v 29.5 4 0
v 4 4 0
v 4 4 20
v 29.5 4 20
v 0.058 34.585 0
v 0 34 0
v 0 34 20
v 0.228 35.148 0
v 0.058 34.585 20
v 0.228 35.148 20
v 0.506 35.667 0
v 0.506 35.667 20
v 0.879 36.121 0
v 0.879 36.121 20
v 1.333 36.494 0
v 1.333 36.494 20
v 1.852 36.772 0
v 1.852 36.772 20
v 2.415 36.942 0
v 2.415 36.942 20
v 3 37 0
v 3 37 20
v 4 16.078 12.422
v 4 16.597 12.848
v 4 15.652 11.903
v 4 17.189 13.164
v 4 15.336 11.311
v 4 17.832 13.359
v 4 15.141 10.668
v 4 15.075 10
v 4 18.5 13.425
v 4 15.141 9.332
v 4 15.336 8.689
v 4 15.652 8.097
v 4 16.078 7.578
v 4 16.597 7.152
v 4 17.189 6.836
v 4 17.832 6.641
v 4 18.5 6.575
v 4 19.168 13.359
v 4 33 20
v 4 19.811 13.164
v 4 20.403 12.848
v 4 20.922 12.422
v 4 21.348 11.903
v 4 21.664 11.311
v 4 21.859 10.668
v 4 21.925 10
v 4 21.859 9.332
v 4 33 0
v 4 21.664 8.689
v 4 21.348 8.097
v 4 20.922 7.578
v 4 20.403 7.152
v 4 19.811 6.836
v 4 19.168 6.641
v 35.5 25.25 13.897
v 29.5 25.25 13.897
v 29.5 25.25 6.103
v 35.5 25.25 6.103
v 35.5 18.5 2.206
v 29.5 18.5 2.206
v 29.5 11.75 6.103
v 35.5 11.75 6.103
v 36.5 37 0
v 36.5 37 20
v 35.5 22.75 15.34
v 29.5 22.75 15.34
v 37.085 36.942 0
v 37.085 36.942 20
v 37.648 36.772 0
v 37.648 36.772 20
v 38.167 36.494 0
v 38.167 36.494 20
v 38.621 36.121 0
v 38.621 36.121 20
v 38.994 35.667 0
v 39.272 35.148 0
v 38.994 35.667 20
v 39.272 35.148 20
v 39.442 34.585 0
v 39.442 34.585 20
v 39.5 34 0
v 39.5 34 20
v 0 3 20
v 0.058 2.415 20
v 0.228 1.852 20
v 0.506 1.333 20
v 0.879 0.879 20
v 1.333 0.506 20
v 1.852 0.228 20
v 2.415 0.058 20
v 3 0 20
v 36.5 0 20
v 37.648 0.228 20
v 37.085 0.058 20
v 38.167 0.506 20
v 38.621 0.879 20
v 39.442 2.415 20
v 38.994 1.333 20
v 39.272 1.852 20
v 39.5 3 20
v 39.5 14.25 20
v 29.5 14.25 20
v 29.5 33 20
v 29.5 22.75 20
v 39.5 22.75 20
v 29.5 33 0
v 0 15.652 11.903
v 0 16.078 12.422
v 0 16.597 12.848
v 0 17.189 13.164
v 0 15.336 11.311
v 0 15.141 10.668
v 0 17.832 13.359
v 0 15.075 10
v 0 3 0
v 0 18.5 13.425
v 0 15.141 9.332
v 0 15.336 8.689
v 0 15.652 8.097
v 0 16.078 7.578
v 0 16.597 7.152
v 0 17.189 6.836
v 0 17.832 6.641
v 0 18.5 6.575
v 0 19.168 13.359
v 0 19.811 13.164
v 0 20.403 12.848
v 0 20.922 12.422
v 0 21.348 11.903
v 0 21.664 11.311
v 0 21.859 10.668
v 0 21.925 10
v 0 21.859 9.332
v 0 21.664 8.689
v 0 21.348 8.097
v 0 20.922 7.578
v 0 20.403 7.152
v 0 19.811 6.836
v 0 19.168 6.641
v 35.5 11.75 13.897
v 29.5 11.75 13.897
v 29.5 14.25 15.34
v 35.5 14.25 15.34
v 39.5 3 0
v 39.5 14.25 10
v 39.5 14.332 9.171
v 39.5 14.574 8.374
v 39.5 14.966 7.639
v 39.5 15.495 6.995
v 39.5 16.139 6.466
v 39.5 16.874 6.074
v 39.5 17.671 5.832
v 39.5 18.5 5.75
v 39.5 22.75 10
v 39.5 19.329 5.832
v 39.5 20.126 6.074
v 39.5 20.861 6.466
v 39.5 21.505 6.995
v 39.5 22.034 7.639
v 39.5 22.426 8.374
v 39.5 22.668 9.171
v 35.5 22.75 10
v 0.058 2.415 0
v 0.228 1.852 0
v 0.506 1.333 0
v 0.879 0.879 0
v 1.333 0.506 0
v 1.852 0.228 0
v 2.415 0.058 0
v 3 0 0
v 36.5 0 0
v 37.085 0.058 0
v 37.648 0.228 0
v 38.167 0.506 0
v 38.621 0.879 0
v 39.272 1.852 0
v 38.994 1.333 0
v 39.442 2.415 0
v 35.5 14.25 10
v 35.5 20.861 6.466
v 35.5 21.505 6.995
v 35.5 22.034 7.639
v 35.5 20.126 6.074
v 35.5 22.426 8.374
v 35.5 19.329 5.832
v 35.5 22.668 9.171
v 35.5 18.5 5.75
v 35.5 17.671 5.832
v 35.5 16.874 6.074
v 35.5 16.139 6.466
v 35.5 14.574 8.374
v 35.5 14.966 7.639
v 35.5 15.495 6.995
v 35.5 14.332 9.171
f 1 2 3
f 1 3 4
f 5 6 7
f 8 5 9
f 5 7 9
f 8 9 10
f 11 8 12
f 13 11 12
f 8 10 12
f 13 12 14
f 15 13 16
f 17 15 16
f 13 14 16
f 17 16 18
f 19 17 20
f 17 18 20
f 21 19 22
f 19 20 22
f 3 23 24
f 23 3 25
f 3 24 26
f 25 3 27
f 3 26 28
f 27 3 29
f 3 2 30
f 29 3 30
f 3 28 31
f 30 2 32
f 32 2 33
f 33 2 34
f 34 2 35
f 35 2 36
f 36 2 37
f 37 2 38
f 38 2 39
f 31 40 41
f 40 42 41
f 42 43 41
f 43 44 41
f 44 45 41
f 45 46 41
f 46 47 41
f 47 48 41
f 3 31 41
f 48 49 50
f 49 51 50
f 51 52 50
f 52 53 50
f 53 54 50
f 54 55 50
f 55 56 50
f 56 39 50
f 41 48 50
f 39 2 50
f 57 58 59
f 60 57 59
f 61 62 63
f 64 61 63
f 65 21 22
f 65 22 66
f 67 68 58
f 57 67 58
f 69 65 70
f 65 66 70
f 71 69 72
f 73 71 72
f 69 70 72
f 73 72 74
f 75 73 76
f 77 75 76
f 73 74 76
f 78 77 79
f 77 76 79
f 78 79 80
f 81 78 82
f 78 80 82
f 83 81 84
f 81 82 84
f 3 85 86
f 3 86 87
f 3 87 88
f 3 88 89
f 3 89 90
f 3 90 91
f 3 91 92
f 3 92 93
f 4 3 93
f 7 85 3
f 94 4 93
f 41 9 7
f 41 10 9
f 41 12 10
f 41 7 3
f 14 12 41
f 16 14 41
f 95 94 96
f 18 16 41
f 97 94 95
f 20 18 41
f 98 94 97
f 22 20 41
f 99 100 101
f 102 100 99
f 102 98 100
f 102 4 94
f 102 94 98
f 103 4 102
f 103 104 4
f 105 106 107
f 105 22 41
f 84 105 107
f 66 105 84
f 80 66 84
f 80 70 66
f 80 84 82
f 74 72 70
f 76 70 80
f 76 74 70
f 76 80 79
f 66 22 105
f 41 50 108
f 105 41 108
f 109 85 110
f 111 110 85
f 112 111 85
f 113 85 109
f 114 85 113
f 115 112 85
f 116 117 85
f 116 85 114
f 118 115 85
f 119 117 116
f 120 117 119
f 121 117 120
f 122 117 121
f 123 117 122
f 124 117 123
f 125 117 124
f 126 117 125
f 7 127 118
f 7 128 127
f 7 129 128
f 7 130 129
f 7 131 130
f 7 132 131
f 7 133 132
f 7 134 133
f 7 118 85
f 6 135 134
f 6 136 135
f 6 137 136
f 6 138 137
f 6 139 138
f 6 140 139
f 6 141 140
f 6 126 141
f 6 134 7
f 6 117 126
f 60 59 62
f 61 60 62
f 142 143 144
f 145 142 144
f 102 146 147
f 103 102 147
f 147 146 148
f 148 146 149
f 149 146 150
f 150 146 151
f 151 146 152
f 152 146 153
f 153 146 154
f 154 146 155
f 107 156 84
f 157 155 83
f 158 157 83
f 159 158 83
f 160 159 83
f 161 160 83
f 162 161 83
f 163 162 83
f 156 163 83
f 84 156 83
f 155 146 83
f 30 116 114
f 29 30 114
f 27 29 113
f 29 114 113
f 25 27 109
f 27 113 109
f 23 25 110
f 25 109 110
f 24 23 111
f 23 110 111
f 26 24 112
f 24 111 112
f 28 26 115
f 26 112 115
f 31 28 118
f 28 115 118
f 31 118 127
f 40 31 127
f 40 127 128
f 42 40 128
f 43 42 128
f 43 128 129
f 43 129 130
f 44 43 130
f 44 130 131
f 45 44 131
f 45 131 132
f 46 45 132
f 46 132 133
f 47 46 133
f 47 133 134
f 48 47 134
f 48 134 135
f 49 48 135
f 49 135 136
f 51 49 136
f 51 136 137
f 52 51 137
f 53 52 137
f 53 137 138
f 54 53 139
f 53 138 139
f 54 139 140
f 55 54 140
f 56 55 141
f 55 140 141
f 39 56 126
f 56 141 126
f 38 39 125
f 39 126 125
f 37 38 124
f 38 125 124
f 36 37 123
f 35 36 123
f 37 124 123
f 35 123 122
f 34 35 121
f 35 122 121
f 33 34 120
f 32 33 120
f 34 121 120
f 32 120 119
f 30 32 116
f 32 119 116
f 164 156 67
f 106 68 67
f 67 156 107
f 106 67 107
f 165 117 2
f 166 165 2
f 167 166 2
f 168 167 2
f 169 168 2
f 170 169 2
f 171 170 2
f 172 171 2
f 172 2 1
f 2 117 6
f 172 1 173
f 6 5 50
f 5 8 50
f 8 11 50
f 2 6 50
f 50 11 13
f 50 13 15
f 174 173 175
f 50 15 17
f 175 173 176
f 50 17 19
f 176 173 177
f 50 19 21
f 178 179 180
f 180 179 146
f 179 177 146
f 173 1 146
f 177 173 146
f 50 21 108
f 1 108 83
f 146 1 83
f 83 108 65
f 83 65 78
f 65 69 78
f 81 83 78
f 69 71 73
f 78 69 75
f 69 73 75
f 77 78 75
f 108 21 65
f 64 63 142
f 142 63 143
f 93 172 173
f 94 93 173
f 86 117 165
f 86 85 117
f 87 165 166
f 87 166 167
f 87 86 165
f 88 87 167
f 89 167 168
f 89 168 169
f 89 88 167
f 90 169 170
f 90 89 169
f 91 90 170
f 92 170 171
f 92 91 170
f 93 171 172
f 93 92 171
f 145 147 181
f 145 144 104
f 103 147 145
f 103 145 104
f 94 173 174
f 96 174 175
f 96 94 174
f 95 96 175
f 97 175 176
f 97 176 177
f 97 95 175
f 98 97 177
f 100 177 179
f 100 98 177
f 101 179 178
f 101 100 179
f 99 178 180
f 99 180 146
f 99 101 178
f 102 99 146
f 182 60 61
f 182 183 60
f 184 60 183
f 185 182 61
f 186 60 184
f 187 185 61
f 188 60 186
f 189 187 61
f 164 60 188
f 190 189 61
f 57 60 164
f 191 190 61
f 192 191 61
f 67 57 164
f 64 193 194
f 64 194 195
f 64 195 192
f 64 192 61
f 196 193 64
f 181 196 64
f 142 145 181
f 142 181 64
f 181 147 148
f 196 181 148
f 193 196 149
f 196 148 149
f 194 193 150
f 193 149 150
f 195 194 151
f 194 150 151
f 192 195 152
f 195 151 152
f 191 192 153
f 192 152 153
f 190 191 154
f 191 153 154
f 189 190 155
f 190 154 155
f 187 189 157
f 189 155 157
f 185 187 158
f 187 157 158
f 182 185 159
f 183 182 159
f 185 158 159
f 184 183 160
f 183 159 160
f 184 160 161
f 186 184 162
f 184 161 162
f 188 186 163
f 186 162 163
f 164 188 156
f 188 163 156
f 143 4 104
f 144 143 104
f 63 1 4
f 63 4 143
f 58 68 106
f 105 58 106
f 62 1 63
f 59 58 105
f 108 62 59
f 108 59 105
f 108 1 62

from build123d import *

# Parameters (mm, degrees)
SKETCH004_W     = 39.5
SKETCH004_H     = 37
SKETCH004_W_2   = 25.5
SKETCH004_H_2   = 29
PAD002_DEPTH    = 20
SKETCH005_R     = 3.425
HOLE003_DEPTH   = 5
HOLE003_TIPS_R  = 3.425
SKETCH006_R     = 4.25
HOLE004_DEPTH   = 15
HOLE004_TIPS_R  = 4.25
POCKET_DEPTH    = 6
SKETCH008_W     = 8.5
SKETCH008_H     = 10
POCKET001_DEPTH = 15
FILLET003_R     = 3


with BuildPart() as part:
    # Sketch004 → Pad002 (new body)
    with BuildSketch(Plane.XY):
        with Locations((19.75, 18.5)):
            Rectangle(SKETCH004_W, SKETCH004_H)
        with Locations((16.75, 18.5)):
            Rectangle(SKETCH004_W_2, SKETCH004_H_2, mode=Mode.SUBTRACT)
    extrude(amount=PAD002_DEPTH)

    # Sketch005 (on Face4 of Pad002) → Hole003 (cut)
    with BuildSketch(Plane(origin=(0, 0, 0), x_dir=(0, -1, 0), z_dir=(-1, 0, 0))):
        with Locations((-18.5, 10)):
            Circle(SKETCH005_R)
    extrude(amount=-HOLE003_DEPTH, mode=Mode.SUBTRACT)

    # Hole003 tips → Hole003 tip 1 section 0
    with BuildSketch(Plane(origin=(5, 0, 0), x_dir=(0, -1, 0), z_dir=(-1, 0, 0)), mode=Mode.PRIVATE) as hole003_tip_1_s0:
        with Locations((-18.5, 10)):
            Circle(HOLE003_TIPS_R)
    loft([hole003_tip_1_s0.sketch, Vertex(7.057948, 18.5, 10)], mode=Mode.SUBTRACT)

    # Sketch006 (on Face3 of Hole003) → Hole004 (cut)
    with BuildSketch(Plane.YZ.offset(39.5)):
        with Locations((18.5, 10)):
            Circle(SKETCH006_R)
    extrude(amount=-HOLE004_DEPTH, mode=Mode.SUBTRACT)

    # Hole004 tips → Hole004 tip 1 section 0
    with BuildSketch(Plane.YZ.offset(24.5), mode=Mode.PRIVATE) as hole004_tip_1_s0:
        with Locations((18.5, 10)):
            Circle(HOLE004_TIPS_R)
    loft([hole004_tip_1_s0.sketch, Vertex(21.946342, 18.5, 10)], mode=Mode.SUBTRACT)

    # Sketch007 (on Face10 of Hole004) → Pocket (cut)
    with BuildSketch(Plane(origin=(29.5, 0, 0), x_dir=(0, -1, 0), z_dir=(-1, 0, 0))):
        Polygon((-11.75, 13.897114), (-18.5, 17.794229), (-25.25, 13.897114), (-25.25, 6.102886), (-18.5, 2.205771), (-11.75, 6.102886), align=None)
    extrude(amount=-POCKET_DEPTH, mode=Mode.SUBTRACT)

    # Sketch008 (on Face3 of Pocket) → Pocket001 (cut)
    with BuildSketch(Plane.YZ.offset(39.5)):
        with Locations((18.5, 15)):
            Rectangle(SKETCH008_W, SKETCH008_H)
    extrude(amount=-POCKET001_DEPTH, mode=Mode.SUBTRACT)

    # Fillet003
    fillet003_edges = [part.edges().sort_by_distance(p)[0] for p in [
        (0, 0, 10),
        (39.5, 0, 10),
        (0, 37, 10),
        (39.5, 37, 10),
    ]]
    fillet(fillet003_edges, radius=FILLET003_R)


solid = part.part
